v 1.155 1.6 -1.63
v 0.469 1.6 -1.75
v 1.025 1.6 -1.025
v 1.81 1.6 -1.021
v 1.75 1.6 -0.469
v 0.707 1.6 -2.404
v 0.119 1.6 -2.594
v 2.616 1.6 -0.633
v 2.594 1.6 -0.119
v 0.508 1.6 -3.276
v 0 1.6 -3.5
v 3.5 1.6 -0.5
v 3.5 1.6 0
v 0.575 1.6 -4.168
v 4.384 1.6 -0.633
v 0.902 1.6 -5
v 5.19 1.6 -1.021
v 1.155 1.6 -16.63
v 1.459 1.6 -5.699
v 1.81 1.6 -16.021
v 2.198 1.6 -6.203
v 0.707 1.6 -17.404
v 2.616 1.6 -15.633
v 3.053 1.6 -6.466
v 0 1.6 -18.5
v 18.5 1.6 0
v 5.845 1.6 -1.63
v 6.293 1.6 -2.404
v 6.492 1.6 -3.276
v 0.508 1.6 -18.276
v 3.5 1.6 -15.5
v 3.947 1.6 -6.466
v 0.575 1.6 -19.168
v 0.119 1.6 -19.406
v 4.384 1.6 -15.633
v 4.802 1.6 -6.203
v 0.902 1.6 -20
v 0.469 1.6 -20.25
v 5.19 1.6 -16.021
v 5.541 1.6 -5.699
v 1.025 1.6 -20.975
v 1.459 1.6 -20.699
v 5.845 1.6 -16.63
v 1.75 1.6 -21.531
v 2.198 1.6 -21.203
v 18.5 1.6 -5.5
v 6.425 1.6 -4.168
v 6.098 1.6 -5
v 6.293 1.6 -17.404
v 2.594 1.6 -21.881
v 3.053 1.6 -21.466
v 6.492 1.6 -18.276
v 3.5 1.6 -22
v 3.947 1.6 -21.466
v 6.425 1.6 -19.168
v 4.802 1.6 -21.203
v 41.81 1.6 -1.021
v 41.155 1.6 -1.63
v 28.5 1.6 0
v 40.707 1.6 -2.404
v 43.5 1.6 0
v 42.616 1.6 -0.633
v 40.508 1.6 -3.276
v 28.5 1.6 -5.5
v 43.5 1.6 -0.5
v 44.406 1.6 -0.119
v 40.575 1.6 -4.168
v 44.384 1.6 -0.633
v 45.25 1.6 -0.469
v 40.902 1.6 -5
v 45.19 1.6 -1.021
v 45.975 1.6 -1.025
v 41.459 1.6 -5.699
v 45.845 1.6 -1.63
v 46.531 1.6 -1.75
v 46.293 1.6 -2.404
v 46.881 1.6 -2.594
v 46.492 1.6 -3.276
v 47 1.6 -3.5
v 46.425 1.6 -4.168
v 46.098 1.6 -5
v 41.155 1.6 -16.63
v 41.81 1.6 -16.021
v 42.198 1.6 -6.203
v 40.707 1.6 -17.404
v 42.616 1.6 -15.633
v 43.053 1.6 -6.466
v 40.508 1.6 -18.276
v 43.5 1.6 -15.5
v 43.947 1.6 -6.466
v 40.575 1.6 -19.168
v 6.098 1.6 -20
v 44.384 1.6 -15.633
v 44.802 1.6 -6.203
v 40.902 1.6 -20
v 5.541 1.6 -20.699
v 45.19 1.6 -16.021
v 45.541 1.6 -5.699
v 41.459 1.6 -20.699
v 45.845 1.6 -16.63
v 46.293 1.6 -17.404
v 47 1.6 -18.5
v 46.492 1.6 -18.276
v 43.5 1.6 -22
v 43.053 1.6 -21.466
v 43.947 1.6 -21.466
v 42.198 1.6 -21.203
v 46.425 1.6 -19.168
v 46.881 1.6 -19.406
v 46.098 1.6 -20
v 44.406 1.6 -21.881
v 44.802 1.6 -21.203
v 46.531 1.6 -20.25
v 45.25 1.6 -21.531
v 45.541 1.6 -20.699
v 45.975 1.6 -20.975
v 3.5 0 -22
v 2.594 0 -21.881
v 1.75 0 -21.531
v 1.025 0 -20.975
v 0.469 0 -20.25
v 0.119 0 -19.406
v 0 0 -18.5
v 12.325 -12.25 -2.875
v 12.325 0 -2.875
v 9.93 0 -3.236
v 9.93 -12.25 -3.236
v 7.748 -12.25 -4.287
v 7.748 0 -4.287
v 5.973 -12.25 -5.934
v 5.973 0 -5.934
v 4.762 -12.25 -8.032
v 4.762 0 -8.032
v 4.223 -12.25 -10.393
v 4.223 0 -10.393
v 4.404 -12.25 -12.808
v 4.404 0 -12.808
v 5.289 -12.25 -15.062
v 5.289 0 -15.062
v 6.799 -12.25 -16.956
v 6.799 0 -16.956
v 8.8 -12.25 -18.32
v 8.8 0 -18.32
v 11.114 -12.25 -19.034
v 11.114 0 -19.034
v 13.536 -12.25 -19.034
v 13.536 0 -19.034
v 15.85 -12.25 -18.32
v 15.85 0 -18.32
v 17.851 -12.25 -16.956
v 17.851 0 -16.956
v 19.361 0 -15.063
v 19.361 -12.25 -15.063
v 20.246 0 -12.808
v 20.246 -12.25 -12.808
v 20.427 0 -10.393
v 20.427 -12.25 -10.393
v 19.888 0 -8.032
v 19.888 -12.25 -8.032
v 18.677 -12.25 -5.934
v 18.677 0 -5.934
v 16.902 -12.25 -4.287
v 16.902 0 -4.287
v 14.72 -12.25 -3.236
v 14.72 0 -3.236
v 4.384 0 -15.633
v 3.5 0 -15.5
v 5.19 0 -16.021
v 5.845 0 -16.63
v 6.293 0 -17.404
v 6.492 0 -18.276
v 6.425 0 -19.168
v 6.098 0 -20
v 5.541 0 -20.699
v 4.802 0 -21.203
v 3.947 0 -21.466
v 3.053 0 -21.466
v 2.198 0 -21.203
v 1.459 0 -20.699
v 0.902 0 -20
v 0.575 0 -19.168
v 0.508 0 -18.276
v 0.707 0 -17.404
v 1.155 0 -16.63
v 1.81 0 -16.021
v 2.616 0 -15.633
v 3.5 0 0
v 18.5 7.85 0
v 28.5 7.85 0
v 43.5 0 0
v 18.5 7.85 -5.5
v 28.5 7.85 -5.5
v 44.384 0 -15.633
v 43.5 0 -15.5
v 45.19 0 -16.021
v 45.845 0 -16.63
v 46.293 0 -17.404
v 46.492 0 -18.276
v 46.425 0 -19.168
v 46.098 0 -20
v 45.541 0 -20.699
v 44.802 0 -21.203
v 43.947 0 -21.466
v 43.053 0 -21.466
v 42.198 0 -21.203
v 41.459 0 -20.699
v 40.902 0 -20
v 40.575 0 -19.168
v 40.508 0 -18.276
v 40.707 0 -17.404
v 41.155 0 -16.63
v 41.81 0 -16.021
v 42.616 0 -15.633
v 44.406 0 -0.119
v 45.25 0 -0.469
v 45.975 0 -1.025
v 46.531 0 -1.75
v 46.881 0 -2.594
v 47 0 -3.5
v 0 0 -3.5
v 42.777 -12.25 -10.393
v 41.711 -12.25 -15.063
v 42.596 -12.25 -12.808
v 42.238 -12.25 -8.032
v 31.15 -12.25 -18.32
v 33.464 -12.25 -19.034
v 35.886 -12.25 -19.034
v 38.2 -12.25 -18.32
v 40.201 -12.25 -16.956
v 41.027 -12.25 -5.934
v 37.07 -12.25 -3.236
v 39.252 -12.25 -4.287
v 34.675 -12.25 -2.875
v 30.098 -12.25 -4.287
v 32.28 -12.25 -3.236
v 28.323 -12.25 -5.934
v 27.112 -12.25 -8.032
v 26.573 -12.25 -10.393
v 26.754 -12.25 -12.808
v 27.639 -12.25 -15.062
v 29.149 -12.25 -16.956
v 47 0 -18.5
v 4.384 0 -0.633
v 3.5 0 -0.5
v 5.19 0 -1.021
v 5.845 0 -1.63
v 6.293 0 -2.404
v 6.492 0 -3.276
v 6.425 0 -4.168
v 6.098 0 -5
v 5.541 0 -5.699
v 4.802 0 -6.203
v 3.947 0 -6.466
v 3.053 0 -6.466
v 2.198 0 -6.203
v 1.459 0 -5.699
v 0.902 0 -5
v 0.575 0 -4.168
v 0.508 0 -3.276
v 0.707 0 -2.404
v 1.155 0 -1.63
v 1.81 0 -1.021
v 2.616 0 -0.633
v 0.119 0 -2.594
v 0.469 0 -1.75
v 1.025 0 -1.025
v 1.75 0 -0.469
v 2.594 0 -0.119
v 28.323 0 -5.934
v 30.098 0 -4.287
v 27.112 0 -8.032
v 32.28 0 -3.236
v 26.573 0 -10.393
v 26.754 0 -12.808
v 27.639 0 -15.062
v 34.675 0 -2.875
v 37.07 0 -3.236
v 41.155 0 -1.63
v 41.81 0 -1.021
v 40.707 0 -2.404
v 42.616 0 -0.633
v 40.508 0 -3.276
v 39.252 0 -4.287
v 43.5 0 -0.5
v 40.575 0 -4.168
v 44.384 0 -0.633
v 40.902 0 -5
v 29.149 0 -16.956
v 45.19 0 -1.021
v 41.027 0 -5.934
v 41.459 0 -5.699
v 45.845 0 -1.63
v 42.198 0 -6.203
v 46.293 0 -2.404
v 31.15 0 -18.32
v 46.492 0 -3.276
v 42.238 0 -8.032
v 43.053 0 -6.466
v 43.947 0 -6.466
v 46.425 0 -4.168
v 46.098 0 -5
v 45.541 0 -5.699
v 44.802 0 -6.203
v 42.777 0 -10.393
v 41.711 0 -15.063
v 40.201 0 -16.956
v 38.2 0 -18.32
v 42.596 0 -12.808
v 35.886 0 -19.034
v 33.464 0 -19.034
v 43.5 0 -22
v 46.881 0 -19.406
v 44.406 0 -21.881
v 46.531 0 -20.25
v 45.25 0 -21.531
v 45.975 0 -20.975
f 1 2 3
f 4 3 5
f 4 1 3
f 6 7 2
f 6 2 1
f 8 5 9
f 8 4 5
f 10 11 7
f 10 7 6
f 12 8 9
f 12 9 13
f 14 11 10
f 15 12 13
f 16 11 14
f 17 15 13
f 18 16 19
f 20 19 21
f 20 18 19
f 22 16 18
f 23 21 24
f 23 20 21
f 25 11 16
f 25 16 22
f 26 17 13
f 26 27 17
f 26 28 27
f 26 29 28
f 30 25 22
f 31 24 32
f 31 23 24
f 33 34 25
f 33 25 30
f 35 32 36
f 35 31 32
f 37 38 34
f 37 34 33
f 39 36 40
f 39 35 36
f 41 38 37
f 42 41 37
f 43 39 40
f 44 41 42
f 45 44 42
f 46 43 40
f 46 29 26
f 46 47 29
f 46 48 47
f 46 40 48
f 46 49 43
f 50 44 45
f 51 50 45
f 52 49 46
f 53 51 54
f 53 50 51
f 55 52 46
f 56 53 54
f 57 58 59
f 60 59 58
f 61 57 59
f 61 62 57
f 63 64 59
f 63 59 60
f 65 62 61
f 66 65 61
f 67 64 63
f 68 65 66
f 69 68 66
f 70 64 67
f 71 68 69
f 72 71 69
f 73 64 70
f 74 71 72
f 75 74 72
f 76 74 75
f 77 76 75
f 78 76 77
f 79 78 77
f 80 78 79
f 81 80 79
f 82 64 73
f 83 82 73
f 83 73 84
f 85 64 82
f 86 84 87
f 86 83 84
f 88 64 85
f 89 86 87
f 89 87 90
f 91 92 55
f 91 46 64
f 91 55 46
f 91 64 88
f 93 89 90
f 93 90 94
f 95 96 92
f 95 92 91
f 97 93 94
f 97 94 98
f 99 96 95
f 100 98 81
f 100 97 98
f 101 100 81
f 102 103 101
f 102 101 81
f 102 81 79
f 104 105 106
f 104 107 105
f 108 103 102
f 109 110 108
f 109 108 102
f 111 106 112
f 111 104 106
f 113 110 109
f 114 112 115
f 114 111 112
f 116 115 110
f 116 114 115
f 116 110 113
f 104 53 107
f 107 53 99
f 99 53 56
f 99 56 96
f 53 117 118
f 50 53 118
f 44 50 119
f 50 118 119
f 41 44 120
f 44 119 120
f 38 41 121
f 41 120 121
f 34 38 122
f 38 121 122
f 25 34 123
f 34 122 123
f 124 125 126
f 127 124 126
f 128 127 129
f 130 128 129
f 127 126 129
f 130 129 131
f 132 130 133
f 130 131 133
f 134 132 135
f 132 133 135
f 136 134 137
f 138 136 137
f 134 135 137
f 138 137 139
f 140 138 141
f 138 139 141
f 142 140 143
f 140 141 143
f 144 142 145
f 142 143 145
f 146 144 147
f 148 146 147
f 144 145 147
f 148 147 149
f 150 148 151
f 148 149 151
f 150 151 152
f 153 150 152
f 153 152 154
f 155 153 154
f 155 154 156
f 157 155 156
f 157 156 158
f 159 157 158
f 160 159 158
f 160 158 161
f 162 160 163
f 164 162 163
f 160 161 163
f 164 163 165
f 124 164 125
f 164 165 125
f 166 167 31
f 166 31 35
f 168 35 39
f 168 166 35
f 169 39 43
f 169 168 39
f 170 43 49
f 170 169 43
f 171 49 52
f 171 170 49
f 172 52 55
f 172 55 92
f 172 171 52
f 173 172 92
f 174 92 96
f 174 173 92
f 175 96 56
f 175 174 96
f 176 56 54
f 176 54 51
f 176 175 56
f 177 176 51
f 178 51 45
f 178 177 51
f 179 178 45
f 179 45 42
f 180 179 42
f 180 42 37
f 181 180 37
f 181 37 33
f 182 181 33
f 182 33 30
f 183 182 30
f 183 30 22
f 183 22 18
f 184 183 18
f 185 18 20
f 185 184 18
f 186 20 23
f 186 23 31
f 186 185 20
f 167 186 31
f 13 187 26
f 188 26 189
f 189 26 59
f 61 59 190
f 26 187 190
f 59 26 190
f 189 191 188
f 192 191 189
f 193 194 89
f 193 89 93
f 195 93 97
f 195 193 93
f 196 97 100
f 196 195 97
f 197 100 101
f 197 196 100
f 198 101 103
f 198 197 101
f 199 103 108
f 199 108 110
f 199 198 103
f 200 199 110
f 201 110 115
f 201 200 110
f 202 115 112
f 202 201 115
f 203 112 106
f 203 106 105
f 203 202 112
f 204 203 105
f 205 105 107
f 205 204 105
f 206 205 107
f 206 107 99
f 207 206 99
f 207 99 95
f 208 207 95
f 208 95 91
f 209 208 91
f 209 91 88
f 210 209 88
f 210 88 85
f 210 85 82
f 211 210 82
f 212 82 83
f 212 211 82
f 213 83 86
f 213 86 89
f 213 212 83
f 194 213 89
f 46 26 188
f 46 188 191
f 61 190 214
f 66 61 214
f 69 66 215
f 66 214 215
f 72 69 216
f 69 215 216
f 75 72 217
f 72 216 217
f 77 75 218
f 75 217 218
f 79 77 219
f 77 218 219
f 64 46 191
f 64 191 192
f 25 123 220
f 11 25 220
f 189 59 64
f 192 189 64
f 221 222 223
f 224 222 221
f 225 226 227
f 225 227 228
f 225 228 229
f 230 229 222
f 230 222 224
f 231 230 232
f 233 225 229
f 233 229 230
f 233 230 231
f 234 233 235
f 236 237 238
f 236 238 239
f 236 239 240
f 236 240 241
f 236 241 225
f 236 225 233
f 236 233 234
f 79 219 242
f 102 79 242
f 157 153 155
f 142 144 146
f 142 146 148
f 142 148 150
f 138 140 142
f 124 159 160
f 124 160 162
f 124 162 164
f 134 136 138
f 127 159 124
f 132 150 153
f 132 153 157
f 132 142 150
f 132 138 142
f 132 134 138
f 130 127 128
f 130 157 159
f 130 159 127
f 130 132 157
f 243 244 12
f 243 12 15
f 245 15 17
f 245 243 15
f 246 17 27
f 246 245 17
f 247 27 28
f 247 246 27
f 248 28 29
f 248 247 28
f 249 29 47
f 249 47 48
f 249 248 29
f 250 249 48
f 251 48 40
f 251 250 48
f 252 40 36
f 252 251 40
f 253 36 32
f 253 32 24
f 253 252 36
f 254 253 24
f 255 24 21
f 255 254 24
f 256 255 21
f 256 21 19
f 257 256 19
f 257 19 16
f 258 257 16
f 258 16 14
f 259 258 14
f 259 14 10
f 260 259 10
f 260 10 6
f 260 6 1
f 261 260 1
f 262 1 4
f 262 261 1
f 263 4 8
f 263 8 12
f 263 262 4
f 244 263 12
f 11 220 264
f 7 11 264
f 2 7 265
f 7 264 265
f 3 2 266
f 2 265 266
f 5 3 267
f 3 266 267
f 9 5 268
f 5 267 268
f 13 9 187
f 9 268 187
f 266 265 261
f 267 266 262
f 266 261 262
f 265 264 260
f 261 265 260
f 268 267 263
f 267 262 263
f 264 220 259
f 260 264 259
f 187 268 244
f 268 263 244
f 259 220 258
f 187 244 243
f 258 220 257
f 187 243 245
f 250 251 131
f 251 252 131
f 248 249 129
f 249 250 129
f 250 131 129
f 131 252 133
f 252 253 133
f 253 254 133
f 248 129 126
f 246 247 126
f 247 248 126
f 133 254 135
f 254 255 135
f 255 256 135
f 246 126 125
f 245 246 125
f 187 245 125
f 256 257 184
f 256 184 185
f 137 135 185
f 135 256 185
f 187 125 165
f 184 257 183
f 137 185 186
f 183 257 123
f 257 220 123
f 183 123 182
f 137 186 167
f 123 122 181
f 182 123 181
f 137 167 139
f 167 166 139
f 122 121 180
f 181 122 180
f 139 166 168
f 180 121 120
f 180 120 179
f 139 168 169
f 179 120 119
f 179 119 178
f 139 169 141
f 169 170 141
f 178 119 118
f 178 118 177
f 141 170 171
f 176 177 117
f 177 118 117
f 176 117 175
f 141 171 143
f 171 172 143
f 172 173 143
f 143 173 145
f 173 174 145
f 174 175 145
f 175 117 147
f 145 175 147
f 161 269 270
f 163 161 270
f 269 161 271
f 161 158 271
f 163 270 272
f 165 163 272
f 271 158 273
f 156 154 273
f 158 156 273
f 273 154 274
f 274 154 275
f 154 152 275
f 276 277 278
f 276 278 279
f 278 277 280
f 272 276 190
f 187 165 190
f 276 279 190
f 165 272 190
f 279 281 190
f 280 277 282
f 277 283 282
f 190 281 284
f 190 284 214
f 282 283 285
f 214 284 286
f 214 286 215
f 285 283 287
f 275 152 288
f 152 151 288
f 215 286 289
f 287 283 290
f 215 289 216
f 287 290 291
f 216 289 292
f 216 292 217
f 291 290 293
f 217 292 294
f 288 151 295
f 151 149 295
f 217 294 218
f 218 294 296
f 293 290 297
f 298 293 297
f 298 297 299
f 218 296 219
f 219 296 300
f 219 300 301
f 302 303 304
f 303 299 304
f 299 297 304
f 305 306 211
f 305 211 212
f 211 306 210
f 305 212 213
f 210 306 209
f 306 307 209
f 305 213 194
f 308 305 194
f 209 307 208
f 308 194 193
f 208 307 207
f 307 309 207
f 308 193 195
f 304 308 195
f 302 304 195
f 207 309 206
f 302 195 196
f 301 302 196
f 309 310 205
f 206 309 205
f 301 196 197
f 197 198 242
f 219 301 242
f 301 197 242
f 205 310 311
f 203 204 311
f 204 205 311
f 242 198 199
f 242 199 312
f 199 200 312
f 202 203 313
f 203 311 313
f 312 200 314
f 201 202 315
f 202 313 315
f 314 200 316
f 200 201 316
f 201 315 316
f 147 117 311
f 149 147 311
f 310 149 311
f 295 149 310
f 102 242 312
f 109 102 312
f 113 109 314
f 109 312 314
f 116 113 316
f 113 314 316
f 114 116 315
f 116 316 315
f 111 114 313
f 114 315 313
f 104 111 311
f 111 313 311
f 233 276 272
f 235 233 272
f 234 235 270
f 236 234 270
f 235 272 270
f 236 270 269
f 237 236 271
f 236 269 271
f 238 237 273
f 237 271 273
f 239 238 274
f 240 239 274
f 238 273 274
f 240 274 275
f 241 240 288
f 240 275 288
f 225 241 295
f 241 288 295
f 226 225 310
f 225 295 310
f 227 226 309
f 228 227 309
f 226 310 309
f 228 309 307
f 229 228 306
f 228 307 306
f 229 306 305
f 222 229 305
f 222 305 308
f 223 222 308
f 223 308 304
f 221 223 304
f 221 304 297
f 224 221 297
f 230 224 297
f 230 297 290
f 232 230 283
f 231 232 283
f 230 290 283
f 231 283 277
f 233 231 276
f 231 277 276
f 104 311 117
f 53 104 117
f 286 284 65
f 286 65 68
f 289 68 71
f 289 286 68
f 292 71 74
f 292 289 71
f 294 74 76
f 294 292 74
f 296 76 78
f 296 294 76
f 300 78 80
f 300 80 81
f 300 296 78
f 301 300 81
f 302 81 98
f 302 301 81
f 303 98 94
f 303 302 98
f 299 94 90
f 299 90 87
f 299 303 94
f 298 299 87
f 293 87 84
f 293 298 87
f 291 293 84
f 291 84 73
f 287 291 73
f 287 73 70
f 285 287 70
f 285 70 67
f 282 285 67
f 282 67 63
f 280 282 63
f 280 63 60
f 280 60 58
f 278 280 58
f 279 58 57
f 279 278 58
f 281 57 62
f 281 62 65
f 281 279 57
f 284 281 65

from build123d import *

# Parameters (mm, degrees)
SKETCH1_R           = 3
BOSS_EXTRUDE1_DEPTH = 1.6
SKETCH2_W           = 10
SKETCH2_H           = 5.5
BOSS_EXTRUDE2_DEPTH = 6.25
SKETCH3_R           = 8.125
BOSS_EXTRUDE3_DEPTH = 12.25


with BuildPart() as part:
    # Sketch1 → Boss-Extrude1 (new body)
    with BuildSketch(Plane(origin=(0, 0, 0), x_dir=(1, 0, 0), z_dir=(0, 1, 0))):
        with BuildLine():
            Line((3.5, 0), (43.5, 0))
            ThreePointArc((43.5, 0), (45.974873734, 1.025126266), (47, 3.5))
            Line((47, 3.5), (47, 18.5))
            ThreePointArc((47, 18.5), (45.974873734, 20.974873734), (43.5, 22))
            Line((43.5, 22), (3.5, 22))
            ThreePointArc((3.5, 22), (1.025126266, 20.974873734), (0, 18.5))
            Line((0, 18.5), (0, 3.5))
            ThreePointArc((0, 3.5), (1.025126266, 1.025126266), (3.5, 0))
        make_face()
        with Locations(Location((3.5, 18.5, 0), (0, 0, 270))):
            Circle(SKETCH1_R, mode=Mode.SUBTRACT)
        with Locations(Location((3.5, 3.5, 0), (0, 0, 270))):
            Circle(SKETCH1_R, mode=Mode.SUBTRACT)
        with Locations(Location((43.5, 3.5, 0), (0, 0, 270))):
            Circle(SKETCH1_R, mode=Mode.SUBTRACT)
        with Locations(Location((43.5, 18.5, 0), (0, 0, 270))):
            Circle(SKETCH1_R, mode=Mode.SUBTRACT)
    extrude(amount=BOSS_EXTRUDE1_DEPTH)

    # Sketch2 → Boss-Extrude2 (add)
    with BuildSketch(Plane(origin=(0, 1.6, 0), x_dir=(1, 0, 0), z_dir=(0, 1, 0))):
        with Locations((23.5, 2.75)):
            Rectangle(SKETCH2_W, SKETCH2_H)
    extrude(amount=BOSS_EXTRUDE2_DEPTH)

    # Sketch3 → Boss-Extrude3 (add)
    with BuildSketch(Plane(origin=(0, 0, 0), x_dir=(-1, 0, 0), z_dir=(0, -1, 0))):
        with Locations(Location((-12.325, 11, 0), (0, 0, 270))):
            Circle(SKETCH3_R)
        with Locations(Location((-34.675, 11, 0), (0, 0, 270))):
            Circle(SKETCH3_R)
    extrude(amount=BOSS_EXTRUDE3_DEPTH)


solid = part.part
